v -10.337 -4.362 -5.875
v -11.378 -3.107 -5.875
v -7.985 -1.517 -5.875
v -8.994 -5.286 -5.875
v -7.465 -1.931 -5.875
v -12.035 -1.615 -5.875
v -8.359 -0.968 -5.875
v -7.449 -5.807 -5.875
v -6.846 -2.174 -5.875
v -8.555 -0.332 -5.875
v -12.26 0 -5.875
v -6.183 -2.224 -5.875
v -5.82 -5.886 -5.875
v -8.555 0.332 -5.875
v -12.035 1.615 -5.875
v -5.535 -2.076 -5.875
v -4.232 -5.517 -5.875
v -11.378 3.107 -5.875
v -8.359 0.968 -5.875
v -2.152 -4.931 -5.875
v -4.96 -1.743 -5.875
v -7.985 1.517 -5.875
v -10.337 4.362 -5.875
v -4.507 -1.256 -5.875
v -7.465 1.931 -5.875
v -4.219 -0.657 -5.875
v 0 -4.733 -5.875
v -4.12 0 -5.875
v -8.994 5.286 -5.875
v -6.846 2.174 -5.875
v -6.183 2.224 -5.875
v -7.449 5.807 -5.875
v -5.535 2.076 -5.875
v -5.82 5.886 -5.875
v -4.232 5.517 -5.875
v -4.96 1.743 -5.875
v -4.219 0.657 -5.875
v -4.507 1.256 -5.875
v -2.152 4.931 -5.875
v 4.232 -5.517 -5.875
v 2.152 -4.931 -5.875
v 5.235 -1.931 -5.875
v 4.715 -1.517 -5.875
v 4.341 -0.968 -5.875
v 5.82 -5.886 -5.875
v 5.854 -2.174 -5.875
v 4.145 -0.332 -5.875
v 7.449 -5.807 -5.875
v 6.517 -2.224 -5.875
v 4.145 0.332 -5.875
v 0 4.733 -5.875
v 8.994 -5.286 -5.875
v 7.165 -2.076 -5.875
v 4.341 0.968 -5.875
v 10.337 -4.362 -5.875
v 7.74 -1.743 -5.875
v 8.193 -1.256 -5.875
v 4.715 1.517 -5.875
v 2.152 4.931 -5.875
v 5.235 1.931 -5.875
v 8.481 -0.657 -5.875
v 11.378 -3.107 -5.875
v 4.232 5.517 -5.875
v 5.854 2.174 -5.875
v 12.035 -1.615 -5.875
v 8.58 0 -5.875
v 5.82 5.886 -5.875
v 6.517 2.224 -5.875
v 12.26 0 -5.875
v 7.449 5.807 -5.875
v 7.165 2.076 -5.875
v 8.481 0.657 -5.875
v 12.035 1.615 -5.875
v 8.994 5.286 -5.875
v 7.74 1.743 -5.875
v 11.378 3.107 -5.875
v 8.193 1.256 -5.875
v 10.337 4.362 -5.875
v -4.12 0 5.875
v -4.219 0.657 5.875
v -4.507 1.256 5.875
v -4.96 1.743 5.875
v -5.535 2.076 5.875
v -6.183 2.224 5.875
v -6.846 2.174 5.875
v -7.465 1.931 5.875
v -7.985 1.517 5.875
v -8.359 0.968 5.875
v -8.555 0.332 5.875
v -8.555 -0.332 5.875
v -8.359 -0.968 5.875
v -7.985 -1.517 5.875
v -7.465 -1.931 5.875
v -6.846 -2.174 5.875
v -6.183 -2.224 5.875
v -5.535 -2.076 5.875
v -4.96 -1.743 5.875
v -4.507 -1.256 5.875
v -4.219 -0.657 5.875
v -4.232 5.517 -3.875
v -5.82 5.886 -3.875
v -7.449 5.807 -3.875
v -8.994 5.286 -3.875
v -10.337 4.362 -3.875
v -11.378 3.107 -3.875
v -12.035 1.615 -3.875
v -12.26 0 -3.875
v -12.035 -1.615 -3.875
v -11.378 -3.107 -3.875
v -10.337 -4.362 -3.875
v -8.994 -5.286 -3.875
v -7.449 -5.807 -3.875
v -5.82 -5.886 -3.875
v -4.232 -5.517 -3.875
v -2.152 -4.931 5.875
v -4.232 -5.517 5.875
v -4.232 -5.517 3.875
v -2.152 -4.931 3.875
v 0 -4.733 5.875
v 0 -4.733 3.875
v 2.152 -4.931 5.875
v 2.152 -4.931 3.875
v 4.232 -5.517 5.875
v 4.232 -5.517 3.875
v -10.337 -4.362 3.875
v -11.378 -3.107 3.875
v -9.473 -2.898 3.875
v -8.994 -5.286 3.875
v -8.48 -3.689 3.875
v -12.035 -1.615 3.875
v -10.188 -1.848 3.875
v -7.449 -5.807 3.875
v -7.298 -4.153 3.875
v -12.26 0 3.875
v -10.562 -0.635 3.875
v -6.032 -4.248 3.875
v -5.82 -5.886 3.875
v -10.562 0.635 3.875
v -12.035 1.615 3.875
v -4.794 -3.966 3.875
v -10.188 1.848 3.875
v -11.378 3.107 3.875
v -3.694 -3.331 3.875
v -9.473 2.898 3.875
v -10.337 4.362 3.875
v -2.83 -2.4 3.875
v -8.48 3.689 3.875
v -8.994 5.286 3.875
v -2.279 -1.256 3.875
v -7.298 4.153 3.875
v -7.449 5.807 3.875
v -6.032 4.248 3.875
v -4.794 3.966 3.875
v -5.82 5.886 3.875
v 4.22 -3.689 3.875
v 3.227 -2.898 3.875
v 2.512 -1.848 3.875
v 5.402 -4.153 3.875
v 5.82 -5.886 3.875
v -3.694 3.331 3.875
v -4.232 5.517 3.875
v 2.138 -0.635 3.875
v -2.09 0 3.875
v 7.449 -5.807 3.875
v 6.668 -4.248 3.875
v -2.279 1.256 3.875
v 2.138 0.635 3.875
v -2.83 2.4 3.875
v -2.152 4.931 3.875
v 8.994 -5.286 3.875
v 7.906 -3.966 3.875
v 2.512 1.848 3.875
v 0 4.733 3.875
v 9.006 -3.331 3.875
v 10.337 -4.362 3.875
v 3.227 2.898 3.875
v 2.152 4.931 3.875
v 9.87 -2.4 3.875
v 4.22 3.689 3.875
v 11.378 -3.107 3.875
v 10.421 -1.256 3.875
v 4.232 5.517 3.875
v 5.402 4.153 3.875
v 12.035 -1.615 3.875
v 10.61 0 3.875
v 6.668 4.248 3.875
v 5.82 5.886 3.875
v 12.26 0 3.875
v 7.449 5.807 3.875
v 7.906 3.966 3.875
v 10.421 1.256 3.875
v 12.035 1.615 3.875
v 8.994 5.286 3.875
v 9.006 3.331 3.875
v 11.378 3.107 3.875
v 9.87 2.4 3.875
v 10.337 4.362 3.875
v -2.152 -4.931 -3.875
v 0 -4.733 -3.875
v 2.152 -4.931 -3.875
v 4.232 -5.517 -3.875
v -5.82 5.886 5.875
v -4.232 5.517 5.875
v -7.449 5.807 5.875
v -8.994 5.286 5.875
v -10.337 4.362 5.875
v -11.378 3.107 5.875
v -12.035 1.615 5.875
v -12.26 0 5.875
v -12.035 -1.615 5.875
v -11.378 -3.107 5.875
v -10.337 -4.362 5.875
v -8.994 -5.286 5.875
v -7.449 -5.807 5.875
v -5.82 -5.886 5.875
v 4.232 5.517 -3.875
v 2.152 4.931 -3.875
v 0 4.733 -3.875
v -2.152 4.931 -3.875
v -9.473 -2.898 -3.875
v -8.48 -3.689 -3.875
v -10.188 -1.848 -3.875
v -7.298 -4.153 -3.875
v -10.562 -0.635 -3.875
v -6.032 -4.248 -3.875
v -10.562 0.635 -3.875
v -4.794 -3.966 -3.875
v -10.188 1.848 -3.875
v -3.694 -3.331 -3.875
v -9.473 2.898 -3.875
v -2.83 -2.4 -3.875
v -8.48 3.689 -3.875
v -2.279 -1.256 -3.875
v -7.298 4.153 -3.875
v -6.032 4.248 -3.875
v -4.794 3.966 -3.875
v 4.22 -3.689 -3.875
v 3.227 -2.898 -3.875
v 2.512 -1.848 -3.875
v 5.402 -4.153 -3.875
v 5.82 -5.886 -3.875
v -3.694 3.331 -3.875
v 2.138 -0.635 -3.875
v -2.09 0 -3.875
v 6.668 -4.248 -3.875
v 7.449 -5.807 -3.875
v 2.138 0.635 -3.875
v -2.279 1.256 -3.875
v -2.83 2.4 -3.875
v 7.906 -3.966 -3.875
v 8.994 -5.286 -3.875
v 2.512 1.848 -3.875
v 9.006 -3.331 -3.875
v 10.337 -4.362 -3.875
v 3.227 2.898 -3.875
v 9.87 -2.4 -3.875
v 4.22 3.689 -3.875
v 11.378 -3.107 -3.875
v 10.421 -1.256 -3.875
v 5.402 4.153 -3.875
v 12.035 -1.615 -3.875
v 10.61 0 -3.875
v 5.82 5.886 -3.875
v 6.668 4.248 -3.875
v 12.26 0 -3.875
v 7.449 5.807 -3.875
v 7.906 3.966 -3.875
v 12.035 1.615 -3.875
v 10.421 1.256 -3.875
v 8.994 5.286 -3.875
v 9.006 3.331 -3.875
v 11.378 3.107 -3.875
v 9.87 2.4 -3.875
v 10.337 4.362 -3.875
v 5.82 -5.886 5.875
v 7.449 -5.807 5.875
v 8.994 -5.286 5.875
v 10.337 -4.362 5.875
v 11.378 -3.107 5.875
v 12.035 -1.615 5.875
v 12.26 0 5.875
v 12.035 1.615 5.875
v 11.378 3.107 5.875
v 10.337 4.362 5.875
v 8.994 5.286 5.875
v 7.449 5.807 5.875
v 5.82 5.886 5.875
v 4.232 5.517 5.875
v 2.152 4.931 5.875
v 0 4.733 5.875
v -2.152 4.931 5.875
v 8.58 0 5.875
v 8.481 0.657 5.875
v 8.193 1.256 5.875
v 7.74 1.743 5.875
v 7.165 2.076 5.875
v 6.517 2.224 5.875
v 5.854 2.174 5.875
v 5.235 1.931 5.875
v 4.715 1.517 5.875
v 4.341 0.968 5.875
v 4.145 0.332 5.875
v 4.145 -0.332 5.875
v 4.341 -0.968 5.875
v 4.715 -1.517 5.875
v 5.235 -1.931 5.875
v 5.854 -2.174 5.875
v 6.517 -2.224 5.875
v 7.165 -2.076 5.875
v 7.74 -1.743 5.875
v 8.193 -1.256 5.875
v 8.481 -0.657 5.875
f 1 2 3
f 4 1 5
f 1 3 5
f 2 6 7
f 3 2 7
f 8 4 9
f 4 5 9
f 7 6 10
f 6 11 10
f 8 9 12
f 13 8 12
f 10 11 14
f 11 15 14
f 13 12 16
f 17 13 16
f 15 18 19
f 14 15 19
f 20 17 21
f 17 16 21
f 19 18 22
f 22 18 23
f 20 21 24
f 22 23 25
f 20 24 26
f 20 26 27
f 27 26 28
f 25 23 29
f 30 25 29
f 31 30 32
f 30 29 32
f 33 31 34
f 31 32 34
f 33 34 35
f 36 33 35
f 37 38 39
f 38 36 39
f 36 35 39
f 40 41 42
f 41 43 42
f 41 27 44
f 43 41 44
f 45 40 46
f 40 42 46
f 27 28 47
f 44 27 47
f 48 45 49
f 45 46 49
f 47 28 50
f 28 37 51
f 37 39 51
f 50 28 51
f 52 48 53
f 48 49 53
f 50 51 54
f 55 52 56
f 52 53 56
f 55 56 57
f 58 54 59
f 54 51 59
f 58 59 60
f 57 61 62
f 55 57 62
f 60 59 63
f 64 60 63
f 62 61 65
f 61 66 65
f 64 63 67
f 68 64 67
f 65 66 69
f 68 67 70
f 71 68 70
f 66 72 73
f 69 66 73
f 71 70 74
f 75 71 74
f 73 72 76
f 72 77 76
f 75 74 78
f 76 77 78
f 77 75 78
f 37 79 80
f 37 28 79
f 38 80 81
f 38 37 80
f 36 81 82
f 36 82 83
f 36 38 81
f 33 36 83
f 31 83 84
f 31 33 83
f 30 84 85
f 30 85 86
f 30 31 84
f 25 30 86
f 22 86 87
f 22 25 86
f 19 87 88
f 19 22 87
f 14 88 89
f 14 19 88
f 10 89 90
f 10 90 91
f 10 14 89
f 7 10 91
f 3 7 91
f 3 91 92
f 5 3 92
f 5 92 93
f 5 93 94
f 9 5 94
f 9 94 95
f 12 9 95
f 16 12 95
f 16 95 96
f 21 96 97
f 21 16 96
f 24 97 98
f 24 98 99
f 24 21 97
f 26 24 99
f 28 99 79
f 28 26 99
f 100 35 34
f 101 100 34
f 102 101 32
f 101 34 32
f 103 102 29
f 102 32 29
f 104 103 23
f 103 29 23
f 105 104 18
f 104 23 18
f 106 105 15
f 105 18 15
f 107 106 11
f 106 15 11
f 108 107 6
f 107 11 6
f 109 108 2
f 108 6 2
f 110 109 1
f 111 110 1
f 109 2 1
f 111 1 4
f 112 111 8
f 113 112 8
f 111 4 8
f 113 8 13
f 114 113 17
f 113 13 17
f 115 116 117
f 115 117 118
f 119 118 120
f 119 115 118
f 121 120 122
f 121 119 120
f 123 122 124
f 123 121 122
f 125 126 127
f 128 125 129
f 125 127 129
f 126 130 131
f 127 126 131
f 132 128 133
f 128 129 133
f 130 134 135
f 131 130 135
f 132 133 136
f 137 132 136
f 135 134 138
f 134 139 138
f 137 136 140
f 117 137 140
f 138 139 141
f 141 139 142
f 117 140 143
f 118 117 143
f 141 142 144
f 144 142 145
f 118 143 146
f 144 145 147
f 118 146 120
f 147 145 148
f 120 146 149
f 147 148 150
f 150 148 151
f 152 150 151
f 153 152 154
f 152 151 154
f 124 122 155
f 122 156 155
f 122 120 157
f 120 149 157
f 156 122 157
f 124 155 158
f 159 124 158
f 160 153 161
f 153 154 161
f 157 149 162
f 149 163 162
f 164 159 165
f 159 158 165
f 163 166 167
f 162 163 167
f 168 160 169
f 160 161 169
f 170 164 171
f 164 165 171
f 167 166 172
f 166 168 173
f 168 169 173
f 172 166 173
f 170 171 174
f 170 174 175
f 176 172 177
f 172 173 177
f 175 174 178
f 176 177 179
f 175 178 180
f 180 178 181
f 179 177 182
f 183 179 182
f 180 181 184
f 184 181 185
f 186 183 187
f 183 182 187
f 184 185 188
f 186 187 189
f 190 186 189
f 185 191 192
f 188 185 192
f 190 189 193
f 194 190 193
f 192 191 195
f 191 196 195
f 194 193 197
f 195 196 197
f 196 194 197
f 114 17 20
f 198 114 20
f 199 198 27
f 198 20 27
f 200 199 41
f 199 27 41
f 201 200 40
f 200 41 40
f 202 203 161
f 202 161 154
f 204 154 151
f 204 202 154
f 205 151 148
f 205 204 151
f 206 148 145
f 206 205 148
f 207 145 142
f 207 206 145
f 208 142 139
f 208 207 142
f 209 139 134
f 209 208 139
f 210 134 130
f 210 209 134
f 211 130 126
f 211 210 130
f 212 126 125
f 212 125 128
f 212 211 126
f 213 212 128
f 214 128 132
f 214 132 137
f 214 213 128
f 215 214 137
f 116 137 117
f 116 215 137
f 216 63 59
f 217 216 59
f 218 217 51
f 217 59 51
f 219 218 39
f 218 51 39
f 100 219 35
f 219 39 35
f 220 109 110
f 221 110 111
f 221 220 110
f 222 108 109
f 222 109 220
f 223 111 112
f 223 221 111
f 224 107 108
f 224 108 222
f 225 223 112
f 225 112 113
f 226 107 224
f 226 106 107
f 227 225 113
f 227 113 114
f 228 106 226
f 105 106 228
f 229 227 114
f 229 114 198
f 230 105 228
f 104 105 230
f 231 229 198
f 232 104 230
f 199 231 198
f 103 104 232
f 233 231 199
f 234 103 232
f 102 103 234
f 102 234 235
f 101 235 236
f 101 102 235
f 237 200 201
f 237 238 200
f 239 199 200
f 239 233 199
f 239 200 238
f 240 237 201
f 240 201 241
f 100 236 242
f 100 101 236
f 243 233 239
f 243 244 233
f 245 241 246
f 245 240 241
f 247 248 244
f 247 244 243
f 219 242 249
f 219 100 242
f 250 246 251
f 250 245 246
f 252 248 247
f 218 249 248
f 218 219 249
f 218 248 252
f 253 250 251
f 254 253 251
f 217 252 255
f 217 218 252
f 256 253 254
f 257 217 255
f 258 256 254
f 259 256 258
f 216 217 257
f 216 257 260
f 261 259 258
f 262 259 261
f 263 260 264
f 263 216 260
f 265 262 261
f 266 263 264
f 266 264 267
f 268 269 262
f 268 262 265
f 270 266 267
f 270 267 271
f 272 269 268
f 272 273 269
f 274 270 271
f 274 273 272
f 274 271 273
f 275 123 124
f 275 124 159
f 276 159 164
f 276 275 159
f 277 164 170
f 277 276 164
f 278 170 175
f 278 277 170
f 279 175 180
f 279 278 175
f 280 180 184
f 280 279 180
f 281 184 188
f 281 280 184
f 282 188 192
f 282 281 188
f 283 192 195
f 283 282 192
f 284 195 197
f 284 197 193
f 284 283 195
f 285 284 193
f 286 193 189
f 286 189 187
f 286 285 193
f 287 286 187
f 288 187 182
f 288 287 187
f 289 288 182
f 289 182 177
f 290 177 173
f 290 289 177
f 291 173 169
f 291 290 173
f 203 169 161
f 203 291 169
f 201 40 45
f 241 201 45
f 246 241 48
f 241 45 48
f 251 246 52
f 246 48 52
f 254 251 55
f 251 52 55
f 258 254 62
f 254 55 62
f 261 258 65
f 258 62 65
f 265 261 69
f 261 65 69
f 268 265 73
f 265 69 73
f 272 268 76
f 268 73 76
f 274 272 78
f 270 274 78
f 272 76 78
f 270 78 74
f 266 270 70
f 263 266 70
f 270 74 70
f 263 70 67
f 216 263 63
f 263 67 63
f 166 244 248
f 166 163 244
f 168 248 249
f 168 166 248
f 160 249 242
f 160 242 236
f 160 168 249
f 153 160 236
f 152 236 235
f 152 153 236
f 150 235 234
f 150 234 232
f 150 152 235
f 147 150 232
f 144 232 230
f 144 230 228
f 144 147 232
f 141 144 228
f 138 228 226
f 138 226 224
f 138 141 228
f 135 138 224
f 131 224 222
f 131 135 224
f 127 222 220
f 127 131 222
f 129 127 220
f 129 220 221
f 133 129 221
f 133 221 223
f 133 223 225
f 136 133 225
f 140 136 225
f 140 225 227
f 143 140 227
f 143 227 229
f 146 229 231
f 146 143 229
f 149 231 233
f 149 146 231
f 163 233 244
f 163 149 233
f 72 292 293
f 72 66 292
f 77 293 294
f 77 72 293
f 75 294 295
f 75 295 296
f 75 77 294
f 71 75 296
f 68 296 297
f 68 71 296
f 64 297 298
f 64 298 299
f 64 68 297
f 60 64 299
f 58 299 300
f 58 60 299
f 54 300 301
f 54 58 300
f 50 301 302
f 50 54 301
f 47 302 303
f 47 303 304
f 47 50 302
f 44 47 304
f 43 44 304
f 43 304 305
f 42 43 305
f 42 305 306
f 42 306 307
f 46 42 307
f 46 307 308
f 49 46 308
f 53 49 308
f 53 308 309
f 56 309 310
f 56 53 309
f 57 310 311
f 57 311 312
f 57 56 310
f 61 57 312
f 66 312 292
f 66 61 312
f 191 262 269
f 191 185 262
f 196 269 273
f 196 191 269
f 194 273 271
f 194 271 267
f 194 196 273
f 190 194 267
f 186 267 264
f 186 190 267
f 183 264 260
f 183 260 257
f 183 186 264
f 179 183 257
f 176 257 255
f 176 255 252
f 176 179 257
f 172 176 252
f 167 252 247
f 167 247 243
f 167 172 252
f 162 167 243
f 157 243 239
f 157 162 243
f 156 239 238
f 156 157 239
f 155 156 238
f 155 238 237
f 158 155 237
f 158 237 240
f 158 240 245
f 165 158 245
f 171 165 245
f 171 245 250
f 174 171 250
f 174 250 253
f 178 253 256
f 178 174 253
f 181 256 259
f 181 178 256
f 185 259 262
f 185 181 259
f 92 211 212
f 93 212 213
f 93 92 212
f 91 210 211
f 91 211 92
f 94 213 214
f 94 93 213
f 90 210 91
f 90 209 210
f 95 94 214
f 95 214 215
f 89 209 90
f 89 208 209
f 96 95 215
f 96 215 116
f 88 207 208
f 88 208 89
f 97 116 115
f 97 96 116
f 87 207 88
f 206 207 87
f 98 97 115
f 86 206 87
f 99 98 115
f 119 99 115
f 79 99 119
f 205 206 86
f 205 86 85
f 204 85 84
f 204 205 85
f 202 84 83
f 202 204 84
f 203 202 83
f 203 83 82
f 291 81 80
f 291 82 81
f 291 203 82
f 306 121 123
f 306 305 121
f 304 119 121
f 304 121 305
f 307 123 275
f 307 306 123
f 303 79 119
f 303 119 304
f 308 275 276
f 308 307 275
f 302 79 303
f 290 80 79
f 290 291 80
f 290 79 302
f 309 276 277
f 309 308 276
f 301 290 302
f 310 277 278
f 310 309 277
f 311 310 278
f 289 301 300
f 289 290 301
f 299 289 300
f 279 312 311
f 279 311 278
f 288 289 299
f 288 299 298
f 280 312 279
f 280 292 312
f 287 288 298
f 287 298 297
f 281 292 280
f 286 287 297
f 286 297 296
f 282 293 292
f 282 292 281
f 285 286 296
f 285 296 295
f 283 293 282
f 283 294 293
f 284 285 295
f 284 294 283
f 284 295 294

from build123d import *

# Parameters (mm, degrees)
SKETCH_1_R        = 4.26
SKETCH_1_R_2      = 2.23
EXTRUDE_1_DEPTH   = 5.875
EXTRUDE_1_2_DEPTH = 5.875
EXTRUDE_START     = 5.875
SKETCH_2_R        = 3
EXTRUDE_2_DEPTH   = 2


with BuildPart() as part:
    # Эскиз1 → Бобышка-Вытянуть1 (new, symmetric)
    with BuildSketch(Plane.XY):
        with Locations((-6.35, 0)):
            Circle(SKETCH_1_R)
        with Locations((-6.35, 0)):
            Circle(SKETCH_1_R_2, mode=Mode.SUBTRACT)
    extrude(amount=EXTRUDE_1_DEPTH, both=True)



with BuildPart() as body_2:
    # Эскиз1 → Extrude 1 2 (new, symmetric)
    with BuildSketch(Plane.XY):
        with Locations((6.35, 0)):
            Circle(SKETCH_1_R)
        with Locations((6.35, 0)):
            Circle(SKETCH_1_R_2, mode=Mode.SUBTRACT)
    extrude(amount=EXTRUDE_1_2_DEPTH, both=True)


with BuildPart() as part_1:
    add(part.part)

    add(body_2.part)  # Бобышка-Вытянуть2 merges body 2
    # Эскиз2 → Бобышка-Вытянуть2 (add)
    with BuildSketch(Plane.XY.offset(EXTRUDE_START)):
        with BuildLine():
            ThreePointArc((-4.232138826, 5.517496176), (-12.26, 0), (-4.232138826, -5.517496176))
            ThreePointArc((-4.232138826, -5.517496176), (0, -4.733152662), (4.232138826, -5.517496176))
            ThreePointArc((4.232138826, -5.517496176), (12.26, 0), (4.232138826, 5.517496176))
            ThreePointArc((4.232138826, 5.517496176), (0, 4.733152662), (-4.232138826, 5.517496176))
        make_face()
        with Locations((-6.35, 0)):
            Circle(SKETCH_2_R, mode=Mode.SUBTRACT)
        with Locations((6.35, 0)):
            Circle(SKETCH_2_R, mode=Mode.SUBTRACT)
    extrude_2 = extrude(amount=-EXTRUDE_2_DEPTH)

    # Зеркальное отражение1: Бобышка-Вытянуть2 across plane
    add(extrude_2.mirror(Plane.XY))


solid = part_1.part
